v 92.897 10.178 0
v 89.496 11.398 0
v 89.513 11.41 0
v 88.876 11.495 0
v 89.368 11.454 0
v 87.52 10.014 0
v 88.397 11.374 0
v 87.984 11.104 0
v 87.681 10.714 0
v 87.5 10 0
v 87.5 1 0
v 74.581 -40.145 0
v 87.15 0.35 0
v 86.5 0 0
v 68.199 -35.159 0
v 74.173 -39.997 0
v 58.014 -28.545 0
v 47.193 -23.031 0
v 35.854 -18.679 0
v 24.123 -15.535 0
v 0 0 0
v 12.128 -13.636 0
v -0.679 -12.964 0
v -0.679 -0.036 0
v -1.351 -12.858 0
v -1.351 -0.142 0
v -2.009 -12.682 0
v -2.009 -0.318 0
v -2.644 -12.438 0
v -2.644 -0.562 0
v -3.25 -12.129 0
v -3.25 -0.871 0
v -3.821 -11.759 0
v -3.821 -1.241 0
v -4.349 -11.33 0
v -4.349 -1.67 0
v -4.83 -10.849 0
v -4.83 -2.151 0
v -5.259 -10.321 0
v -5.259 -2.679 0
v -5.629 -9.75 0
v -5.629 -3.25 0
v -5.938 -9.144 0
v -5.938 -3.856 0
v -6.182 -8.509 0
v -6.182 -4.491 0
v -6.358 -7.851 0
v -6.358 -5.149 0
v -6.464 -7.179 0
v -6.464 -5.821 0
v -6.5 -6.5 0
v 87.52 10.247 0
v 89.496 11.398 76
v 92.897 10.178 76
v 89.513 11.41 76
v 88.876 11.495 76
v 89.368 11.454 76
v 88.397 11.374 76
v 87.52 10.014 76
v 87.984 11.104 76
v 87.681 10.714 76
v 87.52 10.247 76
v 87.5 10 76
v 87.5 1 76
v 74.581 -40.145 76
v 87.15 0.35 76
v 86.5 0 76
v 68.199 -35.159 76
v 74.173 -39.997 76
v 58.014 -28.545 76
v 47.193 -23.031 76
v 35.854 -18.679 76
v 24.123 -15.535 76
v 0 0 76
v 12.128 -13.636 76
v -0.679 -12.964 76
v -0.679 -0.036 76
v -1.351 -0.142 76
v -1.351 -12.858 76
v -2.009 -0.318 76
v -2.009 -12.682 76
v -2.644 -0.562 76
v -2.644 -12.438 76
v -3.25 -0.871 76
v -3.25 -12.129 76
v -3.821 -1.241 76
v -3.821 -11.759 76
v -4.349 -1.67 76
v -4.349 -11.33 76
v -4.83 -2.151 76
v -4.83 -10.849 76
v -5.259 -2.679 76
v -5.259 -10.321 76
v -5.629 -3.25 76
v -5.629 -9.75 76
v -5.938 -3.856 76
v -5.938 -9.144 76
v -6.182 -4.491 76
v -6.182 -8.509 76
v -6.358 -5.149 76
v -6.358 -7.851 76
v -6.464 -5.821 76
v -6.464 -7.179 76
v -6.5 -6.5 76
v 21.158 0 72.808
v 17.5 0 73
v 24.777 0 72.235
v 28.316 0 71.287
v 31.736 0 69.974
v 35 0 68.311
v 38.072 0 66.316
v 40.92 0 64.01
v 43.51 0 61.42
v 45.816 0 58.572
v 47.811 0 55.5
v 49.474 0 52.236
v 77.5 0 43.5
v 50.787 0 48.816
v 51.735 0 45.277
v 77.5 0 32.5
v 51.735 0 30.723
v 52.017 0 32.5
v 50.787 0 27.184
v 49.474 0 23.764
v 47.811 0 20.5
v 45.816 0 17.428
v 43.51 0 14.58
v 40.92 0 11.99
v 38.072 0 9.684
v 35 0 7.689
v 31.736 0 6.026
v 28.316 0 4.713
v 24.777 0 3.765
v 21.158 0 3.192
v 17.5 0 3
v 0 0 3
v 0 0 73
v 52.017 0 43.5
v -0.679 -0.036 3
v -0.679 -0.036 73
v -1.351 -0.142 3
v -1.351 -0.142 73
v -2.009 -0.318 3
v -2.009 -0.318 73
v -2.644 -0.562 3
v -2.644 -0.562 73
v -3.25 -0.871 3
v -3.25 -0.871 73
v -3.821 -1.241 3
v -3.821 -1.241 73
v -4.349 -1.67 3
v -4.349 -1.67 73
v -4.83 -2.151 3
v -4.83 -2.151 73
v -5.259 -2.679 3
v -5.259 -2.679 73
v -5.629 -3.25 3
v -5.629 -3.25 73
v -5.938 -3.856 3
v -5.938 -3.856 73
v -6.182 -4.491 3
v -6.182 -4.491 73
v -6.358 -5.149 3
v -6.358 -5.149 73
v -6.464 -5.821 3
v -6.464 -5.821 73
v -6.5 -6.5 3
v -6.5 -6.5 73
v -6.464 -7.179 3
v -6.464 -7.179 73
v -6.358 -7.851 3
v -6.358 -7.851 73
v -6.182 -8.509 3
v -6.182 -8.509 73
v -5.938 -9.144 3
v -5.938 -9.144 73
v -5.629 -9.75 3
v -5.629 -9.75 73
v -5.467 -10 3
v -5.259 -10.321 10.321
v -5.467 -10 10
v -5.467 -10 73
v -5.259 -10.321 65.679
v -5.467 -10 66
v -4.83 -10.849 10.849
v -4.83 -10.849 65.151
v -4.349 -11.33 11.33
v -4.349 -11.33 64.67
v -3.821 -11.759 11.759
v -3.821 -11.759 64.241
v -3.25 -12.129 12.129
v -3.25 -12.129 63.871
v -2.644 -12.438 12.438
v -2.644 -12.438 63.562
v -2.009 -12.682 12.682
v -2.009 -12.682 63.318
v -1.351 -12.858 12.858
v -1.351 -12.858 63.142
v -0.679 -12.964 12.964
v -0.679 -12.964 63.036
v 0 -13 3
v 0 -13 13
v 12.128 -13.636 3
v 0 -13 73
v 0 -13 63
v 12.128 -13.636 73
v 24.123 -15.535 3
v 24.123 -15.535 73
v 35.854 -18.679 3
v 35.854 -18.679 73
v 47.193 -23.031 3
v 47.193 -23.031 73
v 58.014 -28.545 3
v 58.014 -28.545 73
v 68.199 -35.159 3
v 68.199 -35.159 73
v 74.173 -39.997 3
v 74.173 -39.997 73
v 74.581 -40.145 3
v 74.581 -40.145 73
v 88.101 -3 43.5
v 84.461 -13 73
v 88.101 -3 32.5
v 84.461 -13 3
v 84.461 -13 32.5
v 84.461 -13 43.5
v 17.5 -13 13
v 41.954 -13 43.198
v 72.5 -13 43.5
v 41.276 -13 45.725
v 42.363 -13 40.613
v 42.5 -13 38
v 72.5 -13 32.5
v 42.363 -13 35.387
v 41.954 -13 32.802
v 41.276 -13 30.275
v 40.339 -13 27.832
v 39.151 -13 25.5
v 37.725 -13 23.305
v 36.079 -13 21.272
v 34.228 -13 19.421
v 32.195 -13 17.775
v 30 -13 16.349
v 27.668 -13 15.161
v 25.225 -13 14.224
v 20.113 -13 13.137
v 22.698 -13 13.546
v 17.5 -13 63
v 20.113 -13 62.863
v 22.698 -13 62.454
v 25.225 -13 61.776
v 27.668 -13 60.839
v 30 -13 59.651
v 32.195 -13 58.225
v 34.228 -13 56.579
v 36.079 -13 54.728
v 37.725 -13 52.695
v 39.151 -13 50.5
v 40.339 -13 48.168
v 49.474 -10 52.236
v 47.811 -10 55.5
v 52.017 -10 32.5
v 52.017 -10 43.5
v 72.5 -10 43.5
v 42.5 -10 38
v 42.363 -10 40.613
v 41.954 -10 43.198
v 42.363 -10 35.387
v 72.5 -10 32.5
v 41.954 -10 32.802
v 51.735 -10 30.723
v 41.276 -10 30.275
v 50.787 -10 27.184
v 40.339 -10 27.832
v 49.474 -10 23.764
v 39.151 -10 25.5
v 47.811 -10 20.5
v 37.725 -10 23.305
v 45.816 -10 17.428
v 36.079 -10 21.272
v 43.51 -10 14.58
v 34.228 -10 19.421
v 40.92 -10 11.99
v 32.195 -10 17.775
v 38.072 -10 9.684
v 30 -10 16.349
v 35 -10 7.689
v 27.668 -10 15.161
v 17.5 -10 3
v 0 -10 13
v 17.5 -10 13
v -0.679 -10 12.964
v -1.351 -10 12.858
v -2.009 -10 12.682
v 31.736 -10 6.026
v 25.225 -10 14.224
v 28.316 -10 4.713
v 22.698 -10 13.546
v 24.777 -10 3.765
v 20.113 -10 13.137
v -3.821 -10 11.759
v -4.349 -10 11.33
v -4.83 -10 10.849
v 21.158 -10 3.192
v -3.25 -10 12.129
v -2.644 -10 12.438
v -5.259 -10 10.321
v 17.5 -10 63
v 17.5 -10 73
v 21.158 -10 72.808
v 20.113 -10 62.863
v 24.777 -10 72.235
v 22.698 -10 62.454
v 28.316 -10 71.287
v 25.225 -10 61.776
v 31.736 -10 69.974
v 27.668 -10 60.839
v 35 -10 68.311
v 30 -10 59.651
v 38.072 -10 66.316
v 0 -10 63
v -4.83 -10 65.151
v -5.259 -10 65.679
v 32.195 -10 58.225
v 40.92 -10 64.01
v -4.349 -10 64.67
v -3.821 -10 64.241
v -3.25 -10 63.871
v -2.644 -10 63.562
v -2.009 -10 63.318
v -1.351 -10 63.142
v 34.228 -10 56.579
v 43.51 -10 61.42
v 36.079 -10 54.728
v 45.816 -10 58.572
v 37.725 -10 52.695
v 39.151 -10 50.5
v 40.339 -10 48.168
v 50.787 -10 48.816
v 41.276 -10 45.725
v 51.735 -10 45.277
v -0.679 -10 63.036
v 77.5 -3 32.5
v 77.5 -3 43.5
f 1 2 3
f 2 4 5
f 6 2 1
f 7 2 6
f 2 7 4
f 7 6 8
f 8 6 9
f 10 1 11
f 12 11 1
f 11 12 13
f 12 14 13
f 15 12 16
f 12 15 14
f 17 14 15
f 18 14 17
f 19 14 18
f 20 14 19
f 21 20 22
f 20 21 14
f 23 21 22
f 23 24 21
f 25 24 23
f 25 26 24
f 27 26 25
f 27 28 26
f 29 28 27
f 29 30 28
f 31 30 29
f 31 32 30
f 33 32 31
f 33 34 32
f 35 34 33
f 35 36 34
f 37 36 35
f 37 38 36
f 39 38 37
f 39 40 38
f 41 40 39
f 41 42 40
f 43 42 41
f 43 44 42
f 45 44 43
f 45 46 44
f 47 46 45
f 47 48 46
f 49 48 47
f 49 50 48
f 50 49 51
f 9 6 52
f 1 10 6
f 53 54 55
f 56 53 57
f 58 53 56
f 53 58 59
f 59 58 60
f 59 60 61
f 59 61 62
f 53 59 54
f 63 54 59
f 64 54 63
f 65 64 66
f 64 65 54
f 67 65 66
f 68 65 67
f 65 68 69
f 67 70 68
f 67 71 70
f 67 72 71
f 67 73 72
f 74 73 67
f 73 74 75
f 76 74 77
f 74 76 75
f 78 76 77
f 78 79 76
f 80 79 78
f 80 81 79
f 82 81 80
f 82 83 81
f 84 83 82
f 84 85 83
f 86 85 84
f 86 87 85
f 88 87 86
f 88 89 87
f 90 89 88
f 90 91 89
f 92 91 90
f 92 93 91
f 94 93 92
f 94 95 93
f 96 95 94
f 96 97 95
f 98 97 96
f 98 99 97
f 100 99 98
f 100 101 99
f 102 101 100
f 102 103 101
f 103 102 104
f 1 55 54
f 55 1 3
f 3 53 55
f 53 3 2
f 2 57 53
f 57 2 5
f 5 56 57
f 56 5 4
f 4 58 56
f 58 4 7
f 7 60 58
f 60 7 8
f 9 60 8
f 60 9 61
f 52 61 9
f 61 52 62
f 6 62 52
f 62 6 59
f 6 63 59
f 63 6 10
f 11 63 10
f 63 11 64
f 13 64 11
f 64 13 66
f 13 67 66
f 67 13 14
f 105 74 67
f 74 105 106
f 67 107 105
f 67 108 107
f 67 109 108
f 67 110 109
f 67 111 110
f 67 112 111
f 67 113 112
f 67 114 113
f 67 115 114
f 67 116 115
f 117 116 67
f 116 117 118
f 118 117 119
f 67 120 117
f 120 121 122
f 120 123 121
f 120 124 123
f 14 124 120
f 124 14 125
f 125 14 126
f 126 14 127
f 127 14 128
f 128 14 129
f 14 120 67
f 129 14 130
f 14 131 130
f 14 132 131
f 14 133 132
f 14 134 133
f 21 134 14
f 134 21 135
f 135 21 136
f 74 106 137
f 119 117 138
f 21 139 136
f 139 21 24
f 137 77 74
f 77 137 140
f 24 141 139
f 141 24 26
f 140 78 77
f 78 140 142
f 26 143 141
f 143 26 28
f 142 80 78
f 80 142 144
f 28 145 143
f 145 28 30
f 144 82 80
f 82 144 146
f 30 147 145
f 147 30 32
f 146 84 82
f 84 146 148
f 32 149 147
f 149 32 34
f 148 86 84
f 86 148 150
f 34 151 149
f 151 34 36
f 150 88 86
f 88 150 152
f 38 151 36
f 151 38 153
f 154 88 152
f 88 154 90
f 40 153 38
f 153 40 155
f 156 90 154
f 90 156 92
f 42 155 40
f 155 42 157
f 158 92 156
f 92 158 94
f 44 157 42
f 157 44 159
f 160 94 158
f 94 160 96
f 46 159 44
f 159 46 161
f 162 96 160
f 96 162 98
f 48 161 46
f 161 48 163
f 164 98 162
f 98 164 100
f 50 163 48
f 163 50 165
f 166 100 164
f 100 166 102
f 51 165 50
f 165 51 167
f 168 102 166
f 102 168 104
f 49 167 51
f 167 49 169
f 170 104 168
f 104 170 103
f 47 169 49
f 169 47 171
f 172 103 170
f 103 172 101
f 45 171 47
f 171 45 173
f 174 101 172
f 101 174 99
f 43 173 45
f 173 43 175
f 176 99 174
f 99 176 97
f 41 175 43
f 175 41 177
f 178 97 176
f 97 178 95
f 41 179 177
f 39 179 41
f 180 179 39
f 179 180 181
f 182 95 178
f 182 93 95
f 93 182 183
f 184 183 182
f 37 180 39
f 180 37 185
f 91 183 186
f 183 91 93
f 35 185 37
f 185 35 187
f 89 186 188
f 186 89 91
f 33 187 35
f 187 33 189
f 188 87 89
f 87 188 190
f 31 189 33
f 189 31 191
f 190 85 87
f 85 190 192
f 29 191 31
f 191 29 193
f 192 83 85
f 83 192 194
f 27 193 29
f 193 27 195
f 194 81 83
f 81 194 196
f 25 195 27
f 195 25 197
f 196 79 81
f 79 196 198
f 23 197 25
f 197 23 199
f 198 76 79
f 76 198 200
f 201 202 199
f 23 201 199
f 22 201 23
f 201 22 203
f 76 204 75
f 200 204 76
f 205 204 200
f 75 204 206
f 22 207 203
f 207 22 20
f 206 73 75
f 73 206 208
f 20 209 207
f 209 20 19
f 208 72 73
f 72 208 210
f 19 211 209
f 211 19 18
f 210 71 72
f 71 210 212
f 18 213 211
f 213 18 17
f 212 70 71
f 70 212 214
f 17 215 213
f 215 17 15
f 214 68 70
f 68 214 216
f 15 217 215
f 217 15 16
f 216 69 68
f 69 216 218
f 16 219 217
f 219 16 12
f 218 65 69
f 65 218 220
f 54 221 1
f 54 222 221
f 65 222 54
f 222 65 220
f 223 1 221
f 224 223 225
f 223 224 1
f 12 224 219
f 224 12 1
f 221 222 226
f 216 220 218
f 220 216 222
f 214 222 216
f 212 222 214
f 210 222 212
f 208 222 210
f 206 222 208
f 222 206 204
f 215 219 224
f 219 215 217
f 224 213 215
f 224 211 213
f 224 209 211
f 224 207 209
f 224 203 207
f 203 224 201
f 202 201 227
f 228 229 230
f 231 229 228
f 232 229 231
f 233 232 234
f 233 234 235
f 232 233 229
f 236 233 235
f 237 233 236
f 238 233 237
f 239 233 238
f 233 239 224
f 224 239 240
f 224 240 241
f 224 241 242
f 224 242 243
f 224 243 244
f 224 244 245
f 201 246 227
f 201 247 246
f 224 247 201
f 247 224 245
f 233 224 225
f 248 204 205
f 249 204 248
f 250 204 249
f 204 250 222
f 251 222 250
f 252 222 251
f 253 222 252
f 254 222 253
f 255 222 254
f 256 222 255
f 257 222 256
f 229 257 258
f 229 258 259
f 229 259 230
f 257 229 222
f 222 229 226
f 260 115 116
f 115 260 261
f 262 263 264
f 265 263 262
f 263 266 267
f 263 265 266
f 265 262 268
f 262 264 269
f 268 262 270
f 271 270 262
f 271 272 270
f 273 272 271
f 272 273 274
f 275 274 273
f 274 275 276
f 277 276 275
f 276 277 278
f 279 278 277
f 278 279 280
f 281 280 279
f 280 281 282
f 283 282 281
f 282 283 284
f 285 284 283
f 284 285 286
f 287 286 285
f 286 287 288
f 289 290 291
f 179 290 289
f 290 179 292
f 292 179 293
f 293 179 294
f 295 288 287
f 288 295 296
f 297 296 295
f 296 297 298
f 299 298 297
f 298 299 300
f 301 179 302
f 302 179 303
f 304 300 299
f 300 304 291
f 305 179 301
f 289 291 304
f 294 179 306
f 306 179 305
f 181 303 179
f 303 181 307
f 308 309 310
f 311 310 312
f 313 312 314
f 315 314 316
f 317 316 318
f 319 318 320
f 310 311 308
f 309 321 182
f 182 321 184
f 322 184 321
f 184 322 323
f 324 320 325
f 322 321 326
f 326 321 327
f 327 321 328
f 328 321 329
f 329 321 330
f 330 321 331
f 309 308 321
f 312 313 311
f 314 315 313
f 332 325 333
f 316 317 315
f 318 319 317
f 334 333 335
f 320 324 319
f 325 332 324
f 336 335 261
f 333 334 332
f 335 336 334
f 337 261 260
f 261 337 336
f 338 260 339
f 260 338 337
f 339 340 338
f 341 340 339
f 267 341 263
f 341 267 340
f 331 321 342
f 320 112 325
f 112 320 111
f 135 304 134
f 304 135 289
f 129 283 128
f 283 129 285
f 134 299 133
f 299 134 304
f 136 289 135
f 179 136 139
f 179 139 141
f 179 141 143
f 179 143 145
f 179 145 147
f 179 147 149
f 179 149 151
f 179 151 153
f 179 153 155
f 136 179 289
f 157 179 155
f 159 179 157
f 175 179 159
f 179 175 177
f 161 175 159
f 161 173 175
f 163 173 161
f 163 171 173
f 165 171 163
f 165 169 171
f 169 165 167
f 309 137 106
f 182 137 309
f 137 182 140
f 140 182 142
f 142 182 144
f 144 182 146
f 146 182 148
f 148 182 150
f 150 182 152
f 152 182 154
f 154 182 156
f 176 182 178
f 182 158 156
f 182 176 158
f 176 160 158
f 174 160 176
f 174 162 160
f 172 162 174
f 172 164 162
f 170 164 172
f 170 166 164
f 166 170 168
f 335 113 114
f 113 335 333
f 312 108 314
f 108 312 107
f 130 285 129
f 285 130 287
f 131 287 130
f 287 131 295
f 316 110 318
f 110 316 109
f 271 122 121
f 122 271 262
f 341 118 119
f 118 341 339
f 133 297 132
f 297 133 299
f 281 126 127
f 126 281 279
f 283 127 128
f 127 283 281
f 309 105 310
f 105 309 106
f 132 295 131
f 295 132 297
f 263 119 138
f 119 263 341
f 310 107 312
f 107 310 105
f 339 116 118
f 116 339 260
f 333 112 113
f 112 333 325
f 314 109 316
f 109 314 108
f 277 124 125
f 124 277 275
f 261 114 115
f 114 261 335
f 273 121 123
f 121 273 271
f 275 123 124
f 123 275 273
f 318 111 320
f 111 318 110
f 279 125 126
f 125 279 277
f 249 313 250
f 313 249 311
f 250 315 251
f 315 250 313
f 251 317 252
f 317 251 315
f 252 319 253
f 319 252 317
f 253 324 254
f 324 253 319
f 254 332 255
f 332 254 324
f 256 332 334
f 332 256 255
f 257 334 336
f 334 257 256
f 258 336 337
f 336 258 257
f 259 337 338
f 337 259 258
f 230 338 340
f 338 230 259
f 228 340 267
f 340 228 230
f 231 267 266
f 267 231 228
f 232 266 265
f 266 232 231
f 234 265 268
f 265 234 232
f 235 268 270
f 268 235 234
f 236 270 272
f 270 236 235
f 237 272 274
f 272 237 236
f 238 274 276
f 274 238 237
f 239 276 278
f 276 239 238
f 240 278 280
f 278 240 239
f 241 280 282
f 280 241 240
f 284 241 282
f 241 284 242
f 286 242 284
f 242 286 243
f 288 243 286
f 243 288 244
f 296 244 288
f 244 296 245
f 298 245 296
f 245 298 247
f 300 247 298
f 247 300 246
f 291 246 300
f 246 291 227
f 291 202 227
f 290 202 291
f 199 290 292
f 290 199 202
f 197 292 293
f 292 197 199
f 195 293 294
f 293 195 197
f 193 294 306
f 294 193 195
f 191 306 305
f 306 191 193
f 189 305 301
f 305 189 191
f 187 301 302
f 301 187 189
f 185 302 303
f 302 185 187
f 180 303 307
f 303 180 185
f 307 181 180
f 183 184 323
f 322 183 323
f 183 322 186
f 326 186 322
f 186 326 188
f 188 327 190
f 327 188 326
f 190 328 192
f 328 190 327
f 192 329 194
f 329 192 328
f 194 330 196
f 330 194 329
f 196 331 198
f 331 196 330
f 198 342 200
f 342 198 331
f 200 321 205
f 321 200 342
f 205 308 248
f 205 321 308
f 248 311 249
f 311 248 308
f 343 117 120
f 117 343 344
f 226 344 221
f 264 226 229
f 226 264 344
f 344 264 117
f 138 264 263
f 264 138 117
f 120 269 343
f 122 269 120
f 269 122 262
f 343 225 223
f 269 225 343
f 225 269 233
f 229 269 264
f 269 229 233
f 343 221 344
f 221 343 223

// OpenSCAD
// Diameter of your wireless charger
QiDiameter = 70;
// Thickness of your wireless charger
QiThickness = 10;
// Width of the USB connector that you're using with the wireless charger. I would recommend giving an extra 1mm buffer over what you measured.
USBWidth = 11;
// We'll need this to position the wireless charger at the center of your phone.
PhoneHeight = 140;
// This determines the size of the base where the phone rest on. The default should be fine for most naked phones, but you may want to use a larger value if you have a thick casing.
PhoneThickness = 10;
// The default should be fine, but you can use a different value to have a thicker or thinner wall.
WallThickness = 3;
// The angle (in degrees) that the holder is tilted at.
Tilt = 70;

/* [Hidden] */
$fa = 6;
$fs = 0.5;


// Side Profile in 2D
module Side_Profile() {
 p2x = 0.25*QiDiameter + 0.5*PhoneHeight;
 p4x = p2x + WallThickness;
 p3x = p2x+1.5*cos(Tilt)+1.5;
 p3y = PhoneThickness+1.5*sin(Tilt);
 temp1 = (PhoneThickness-3*tan(Tilt))*cos(Tilt)+3;
 p5x = p3x + temp1*sin(Tilt);
 p5y = p3y - temp1*cos(Tilt);
 temp2 = sin(Tilt) * (p5x - (p5y + QiThickness + WallThickness) / tan(Tilt));
 p6x = temp2*sin(Tilt);
 p6y = -temp2*cos(Tilt) - QiThickness - WallThickness;
    
 difference() {
  union() {
   polygon([[0,0],
            [p2x - 1, 0],
            [p2x - 0.35, 0.35],  // Simple fillet
            [p2x, 1],
            [p2x, PhoneThickness], 
            [p3x, p3y],
            [p5x, p5y],
            [p6x, p6y],
            [0,-QiThickness - WallThickness]
           ]);
   translate([0,-0.5*(QiThickness+WallThickness),0]) circle(d=QiThickness+WallThickness);
   translate([p2x+1.5,PhoneThickness,0]) circle(d=3);
  }
  temp3 = 0.5 * temp2 / cos(Tilt);
  translate([0,-QiThickness - WallThickness - temp3,0]) circle(r=temp3);
 }
}

// Extruded and excess removed
module Extruded() {
 difference() {
  linear_extrude(height = QiDiameter + 2*WallThickness) Side_Profile();
  translate ([-100,-400-QiThickness-WallThickness,WallThickness]) resize([400,400,0]) cube(QiDiameter);
 }
}

// Qi Hole cut
module Qi_Hole() {
 difference() {
  Extruded();
  translate([0,-QiThickness,QiDiameter+WallThickness])
   rotate([-90,0,0])
    linear_extrude(height = 100)
     union() {
      polygon([[-100,0],
               [QiDiameter*0.25,0],
               [QiDiameter*0.25,QiDiameter],
               [-100,QiDiameter]
              ]);
      translate ([QiDiameter*0.25,QiDiameter/2,0]) circle(d=QiDiameter);
     }
  translate([0,-50,QiDiameter+WallThickness-QiThickness])
   rotate([-90,0,0])
    linear_extrude(height = 100)
     difference() {
      union() {
       polygon([[0,0],
                [QiDiameter*0.25,0],
                [QiDiameter*0.25,QiDiameter-2*QiThickness],
                [0,QiDiameter-2*QiThickness],
                [-QiThickness,QiDiameter-QiThickness],
                [-QiThickness,-QiThickness]
               ]);
       translate ([QiDiameter*0.25,(QiDiameter-2*QiThickness)/2,0]) circle(d=QiDiameter-2*QiThickness);
      }
      translate([0,-(QiThickness+WallThickness)/2,0]) circle(r=(QiThickness+WallThickness)/2);
      translate([0,QiDiameter-2*QiThickness+(QiThickness+WallThickness)/2,0]) circle(r=(QiThickness+WallThickness)/2);
     }
 }
}

  


// USB Hole cut
module USB_Hole() {
 difference() {
  Qi_Hole();
  translate([QiDiameter*0.75,0,QiDiameter/2+WallThickness])
   resize([50,QiThickness*2,0])
    cube(USBWidth,center=true);
  translate([QiDiameter*0.75+30+20,-QiThickness-WallThickness,QiDiameter/2+WallThickness])
   resize([60,QiThickness*2,0])
    cube(USBWidth,center=true);
 }
}

USB_Hole();
